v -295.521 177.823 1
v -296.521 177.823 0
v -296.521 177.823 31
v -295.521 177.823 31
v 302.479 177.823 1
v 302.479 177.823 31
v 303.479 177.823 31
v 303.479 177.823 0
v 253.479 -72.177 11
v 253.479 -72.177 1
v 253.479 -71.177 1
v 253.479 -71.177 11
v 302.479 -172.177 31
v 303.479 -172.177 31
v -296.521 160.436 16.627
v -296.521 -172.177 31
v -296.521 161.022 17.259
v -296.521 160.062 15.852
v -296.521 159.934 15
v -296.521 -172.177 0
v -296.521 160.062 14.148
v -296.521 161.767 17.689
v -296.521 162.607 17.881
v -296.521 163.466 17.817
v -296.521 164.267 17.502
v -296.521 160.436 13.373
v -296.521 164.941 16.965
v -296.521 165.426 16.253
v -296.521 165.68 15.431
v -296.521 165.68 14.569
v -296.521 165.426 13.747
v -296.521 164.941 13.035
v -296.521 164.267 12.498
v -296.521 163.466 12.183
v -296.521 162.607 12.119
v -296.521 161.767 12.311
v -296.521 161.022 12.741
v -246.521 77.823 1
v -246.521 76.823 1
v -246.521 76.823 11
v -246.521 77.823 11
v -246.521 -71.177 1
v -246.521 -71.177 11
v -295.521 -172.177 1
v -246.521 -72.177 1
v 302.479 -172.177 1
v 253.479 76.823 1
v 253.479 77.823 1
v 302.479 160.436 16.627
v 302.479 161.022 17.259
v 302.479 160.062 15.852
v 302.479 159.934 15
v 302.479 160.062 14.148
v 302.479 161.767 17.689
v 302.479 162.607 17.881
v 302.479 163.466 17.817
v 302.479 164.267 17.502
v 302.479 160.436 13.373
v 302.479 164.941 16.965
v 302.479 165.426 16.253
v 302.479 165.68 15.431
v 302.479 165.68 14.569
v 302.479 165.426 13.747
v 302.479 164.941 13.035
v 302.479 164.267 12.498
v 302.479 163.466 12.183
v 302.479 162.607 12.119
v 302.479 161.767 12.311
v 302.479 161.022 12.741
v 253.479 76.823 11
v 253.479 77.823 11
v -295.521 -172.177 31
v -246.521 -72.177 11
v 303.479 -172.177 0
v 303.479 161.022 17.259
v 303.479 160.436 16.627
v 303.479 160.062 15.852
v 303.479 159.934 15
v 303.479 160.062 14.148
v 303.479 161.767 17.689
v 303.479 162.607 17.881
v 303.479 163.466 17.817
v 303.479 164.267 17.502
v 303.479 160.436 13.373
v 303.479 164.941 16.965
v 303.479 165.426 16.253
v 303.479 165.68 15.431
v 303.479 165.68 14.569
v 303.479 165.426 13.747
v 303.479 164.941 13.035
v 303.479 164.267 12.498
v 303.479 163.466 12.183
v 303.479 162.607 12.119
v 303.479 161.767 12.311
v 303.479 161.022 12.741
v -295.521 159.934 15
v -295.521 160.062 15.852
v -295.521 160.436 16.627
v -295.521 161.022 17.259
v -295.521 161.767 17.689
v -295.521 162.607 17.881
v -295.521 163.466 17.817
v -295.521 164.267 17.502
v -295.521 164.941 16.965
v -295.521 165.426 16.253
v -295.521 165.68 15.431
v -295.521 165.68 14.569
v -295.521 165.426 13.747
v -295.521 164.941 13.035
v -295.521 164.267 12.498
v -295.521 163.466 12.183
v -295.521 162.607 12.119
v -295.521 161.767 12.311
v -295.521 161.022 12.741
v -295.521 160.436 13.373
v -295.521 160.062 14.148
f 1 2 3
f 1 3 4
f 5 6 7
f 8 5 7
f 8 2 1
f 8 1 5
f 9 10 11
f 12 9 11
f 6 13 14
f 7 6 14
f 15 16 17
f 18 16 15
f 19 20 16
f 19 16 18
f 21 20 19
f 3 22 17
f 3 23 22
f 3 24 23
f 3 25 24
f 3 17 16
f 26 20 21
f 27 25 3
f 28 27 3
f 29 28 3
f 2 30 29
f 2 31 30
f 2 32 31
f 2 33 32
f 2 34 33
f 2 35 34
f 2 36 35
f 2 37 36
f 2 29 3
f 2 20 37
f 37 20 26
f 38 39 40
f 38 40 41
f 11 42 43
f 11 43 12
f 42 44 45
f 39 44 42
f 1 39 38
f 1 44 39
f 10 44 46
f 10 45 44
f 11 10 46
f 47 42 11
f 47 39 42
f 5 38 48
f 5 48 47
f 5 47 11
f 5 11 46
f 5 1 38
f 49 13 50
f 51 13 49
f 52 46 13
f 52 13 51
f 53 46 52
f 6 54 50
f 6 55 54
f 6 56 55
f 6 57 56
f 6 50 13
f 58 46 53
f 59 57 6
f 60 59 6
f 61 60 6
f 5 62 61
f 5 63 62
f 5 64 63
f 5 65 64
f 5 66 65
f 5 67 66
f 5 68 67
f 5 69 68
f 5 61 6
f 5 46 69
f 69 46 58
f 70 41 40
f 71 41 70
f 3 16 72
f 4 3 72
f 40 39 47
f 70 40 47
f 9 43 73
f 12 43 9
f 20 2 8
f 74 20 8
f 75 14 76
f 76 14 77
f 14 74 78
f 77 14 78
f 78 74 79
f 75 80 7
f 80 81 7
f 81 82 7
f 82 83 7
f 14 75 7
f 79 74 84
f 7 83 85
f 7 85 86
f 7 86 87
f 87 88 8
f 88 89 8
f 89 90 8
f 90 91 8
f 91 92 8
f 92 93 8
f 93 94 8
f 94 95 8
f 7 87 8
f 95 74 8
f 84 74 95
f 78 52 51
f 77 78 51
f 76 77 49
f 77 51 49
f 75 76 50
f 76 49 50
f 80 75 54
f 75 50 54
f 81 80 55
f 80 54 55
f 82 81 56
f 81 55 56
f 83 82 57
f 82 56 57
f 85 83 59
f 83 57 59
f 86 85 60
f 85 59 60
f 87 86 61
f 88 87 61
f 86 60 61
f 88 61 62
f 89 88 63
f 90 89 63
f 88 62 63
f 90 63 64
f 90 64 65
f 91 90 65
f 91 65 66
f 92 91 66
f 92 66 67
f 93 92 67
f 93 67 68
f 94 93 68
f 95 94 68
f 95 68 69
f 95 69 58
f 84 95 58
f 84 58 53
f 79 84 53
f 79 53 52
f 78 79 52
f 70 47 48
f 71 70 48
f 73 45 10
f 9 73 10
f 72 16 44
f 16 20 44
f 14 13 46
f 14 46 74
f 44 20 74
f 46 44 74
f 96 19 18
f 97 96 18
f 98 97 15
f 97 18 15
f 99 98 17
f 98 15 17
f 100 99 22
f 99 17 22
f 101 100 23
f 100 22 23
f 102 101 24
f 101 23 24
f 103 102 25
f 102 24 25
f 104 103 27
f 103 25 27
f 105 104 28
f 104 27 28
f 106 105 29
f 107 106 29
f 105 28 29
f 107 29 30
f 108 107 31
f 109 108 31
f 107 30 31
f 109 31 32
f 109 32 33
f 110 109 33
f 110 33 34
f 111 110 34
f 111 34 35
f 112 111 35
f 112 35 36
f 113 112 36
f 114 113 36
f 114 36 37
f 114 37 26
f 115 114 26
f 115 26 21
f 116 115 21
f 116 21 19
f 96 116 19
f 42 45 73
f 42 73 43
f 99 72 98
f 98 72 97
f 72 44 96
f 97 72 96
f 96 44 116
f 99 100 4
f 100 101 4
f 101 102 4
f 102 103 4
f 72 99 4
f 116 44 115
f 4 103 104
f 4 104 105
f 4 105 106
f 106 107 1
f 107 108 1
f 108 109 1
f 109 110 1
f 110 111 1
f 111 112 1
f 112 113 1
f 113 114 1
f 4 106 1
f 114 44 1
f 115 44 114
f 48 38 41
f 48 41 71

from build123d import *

# Parameters (mm, degrees)
F0_W     = 600
F0_H     = 350
F1_DEPTH = 1
F2_W     = 1
F2_H     = 350
F3_DEPTH = 30
F4_R     = 2.888971
F5_DEPTH = 735
F6_W     = 500
F6_H     = 1
F7_DEPTH = 10


with BuildPart() as f1:
    # F0 (on Top) → F1 (new body)
    with BuildSketch(Plane.XY):
        with Locations((3.478525, 2.822831)):
            Rectangle(F0_W, F0_H)
    extrude(amount=F1_DEPTH)

    # F2 (on face) → F3 (join)
    with BuildSketch(Plane.XY.offset(1)):
        with Locations((-296.021475, 2.822831)):
            Rectangle(F2_W, F2_H)
        with Locations((302.978525, 2.822831)):
            Rectangle(F2_W, F2_H)
    extrude(amount=F3_DEPTH)

    # F4 (on face) → F5 (cut)
    with BuildSketch(Plane(origin=(-296.521475, 0, 0), x_dir=(0, -1, 0), z_dir=(-1, 0, 0))):
        with Locations((-162.822831, 15)):
            Circle(F4_R)
    extrude(amount=-F5_DEPTH, mode=Mode.SUBTRACT)

    # F6 (on face) → F7 (join)
    with BuildSketch(Plane.XY.offset(1)):
        with Locations((3.478525, 77.322831)):
            Rectangle(F6_W, F6_H)
        with Locations((3.478525, -71.677169)):
            Rectangle(F6_W, F6_H)
    extrude(amount=F7_DEPTH)


solid = f1.part
